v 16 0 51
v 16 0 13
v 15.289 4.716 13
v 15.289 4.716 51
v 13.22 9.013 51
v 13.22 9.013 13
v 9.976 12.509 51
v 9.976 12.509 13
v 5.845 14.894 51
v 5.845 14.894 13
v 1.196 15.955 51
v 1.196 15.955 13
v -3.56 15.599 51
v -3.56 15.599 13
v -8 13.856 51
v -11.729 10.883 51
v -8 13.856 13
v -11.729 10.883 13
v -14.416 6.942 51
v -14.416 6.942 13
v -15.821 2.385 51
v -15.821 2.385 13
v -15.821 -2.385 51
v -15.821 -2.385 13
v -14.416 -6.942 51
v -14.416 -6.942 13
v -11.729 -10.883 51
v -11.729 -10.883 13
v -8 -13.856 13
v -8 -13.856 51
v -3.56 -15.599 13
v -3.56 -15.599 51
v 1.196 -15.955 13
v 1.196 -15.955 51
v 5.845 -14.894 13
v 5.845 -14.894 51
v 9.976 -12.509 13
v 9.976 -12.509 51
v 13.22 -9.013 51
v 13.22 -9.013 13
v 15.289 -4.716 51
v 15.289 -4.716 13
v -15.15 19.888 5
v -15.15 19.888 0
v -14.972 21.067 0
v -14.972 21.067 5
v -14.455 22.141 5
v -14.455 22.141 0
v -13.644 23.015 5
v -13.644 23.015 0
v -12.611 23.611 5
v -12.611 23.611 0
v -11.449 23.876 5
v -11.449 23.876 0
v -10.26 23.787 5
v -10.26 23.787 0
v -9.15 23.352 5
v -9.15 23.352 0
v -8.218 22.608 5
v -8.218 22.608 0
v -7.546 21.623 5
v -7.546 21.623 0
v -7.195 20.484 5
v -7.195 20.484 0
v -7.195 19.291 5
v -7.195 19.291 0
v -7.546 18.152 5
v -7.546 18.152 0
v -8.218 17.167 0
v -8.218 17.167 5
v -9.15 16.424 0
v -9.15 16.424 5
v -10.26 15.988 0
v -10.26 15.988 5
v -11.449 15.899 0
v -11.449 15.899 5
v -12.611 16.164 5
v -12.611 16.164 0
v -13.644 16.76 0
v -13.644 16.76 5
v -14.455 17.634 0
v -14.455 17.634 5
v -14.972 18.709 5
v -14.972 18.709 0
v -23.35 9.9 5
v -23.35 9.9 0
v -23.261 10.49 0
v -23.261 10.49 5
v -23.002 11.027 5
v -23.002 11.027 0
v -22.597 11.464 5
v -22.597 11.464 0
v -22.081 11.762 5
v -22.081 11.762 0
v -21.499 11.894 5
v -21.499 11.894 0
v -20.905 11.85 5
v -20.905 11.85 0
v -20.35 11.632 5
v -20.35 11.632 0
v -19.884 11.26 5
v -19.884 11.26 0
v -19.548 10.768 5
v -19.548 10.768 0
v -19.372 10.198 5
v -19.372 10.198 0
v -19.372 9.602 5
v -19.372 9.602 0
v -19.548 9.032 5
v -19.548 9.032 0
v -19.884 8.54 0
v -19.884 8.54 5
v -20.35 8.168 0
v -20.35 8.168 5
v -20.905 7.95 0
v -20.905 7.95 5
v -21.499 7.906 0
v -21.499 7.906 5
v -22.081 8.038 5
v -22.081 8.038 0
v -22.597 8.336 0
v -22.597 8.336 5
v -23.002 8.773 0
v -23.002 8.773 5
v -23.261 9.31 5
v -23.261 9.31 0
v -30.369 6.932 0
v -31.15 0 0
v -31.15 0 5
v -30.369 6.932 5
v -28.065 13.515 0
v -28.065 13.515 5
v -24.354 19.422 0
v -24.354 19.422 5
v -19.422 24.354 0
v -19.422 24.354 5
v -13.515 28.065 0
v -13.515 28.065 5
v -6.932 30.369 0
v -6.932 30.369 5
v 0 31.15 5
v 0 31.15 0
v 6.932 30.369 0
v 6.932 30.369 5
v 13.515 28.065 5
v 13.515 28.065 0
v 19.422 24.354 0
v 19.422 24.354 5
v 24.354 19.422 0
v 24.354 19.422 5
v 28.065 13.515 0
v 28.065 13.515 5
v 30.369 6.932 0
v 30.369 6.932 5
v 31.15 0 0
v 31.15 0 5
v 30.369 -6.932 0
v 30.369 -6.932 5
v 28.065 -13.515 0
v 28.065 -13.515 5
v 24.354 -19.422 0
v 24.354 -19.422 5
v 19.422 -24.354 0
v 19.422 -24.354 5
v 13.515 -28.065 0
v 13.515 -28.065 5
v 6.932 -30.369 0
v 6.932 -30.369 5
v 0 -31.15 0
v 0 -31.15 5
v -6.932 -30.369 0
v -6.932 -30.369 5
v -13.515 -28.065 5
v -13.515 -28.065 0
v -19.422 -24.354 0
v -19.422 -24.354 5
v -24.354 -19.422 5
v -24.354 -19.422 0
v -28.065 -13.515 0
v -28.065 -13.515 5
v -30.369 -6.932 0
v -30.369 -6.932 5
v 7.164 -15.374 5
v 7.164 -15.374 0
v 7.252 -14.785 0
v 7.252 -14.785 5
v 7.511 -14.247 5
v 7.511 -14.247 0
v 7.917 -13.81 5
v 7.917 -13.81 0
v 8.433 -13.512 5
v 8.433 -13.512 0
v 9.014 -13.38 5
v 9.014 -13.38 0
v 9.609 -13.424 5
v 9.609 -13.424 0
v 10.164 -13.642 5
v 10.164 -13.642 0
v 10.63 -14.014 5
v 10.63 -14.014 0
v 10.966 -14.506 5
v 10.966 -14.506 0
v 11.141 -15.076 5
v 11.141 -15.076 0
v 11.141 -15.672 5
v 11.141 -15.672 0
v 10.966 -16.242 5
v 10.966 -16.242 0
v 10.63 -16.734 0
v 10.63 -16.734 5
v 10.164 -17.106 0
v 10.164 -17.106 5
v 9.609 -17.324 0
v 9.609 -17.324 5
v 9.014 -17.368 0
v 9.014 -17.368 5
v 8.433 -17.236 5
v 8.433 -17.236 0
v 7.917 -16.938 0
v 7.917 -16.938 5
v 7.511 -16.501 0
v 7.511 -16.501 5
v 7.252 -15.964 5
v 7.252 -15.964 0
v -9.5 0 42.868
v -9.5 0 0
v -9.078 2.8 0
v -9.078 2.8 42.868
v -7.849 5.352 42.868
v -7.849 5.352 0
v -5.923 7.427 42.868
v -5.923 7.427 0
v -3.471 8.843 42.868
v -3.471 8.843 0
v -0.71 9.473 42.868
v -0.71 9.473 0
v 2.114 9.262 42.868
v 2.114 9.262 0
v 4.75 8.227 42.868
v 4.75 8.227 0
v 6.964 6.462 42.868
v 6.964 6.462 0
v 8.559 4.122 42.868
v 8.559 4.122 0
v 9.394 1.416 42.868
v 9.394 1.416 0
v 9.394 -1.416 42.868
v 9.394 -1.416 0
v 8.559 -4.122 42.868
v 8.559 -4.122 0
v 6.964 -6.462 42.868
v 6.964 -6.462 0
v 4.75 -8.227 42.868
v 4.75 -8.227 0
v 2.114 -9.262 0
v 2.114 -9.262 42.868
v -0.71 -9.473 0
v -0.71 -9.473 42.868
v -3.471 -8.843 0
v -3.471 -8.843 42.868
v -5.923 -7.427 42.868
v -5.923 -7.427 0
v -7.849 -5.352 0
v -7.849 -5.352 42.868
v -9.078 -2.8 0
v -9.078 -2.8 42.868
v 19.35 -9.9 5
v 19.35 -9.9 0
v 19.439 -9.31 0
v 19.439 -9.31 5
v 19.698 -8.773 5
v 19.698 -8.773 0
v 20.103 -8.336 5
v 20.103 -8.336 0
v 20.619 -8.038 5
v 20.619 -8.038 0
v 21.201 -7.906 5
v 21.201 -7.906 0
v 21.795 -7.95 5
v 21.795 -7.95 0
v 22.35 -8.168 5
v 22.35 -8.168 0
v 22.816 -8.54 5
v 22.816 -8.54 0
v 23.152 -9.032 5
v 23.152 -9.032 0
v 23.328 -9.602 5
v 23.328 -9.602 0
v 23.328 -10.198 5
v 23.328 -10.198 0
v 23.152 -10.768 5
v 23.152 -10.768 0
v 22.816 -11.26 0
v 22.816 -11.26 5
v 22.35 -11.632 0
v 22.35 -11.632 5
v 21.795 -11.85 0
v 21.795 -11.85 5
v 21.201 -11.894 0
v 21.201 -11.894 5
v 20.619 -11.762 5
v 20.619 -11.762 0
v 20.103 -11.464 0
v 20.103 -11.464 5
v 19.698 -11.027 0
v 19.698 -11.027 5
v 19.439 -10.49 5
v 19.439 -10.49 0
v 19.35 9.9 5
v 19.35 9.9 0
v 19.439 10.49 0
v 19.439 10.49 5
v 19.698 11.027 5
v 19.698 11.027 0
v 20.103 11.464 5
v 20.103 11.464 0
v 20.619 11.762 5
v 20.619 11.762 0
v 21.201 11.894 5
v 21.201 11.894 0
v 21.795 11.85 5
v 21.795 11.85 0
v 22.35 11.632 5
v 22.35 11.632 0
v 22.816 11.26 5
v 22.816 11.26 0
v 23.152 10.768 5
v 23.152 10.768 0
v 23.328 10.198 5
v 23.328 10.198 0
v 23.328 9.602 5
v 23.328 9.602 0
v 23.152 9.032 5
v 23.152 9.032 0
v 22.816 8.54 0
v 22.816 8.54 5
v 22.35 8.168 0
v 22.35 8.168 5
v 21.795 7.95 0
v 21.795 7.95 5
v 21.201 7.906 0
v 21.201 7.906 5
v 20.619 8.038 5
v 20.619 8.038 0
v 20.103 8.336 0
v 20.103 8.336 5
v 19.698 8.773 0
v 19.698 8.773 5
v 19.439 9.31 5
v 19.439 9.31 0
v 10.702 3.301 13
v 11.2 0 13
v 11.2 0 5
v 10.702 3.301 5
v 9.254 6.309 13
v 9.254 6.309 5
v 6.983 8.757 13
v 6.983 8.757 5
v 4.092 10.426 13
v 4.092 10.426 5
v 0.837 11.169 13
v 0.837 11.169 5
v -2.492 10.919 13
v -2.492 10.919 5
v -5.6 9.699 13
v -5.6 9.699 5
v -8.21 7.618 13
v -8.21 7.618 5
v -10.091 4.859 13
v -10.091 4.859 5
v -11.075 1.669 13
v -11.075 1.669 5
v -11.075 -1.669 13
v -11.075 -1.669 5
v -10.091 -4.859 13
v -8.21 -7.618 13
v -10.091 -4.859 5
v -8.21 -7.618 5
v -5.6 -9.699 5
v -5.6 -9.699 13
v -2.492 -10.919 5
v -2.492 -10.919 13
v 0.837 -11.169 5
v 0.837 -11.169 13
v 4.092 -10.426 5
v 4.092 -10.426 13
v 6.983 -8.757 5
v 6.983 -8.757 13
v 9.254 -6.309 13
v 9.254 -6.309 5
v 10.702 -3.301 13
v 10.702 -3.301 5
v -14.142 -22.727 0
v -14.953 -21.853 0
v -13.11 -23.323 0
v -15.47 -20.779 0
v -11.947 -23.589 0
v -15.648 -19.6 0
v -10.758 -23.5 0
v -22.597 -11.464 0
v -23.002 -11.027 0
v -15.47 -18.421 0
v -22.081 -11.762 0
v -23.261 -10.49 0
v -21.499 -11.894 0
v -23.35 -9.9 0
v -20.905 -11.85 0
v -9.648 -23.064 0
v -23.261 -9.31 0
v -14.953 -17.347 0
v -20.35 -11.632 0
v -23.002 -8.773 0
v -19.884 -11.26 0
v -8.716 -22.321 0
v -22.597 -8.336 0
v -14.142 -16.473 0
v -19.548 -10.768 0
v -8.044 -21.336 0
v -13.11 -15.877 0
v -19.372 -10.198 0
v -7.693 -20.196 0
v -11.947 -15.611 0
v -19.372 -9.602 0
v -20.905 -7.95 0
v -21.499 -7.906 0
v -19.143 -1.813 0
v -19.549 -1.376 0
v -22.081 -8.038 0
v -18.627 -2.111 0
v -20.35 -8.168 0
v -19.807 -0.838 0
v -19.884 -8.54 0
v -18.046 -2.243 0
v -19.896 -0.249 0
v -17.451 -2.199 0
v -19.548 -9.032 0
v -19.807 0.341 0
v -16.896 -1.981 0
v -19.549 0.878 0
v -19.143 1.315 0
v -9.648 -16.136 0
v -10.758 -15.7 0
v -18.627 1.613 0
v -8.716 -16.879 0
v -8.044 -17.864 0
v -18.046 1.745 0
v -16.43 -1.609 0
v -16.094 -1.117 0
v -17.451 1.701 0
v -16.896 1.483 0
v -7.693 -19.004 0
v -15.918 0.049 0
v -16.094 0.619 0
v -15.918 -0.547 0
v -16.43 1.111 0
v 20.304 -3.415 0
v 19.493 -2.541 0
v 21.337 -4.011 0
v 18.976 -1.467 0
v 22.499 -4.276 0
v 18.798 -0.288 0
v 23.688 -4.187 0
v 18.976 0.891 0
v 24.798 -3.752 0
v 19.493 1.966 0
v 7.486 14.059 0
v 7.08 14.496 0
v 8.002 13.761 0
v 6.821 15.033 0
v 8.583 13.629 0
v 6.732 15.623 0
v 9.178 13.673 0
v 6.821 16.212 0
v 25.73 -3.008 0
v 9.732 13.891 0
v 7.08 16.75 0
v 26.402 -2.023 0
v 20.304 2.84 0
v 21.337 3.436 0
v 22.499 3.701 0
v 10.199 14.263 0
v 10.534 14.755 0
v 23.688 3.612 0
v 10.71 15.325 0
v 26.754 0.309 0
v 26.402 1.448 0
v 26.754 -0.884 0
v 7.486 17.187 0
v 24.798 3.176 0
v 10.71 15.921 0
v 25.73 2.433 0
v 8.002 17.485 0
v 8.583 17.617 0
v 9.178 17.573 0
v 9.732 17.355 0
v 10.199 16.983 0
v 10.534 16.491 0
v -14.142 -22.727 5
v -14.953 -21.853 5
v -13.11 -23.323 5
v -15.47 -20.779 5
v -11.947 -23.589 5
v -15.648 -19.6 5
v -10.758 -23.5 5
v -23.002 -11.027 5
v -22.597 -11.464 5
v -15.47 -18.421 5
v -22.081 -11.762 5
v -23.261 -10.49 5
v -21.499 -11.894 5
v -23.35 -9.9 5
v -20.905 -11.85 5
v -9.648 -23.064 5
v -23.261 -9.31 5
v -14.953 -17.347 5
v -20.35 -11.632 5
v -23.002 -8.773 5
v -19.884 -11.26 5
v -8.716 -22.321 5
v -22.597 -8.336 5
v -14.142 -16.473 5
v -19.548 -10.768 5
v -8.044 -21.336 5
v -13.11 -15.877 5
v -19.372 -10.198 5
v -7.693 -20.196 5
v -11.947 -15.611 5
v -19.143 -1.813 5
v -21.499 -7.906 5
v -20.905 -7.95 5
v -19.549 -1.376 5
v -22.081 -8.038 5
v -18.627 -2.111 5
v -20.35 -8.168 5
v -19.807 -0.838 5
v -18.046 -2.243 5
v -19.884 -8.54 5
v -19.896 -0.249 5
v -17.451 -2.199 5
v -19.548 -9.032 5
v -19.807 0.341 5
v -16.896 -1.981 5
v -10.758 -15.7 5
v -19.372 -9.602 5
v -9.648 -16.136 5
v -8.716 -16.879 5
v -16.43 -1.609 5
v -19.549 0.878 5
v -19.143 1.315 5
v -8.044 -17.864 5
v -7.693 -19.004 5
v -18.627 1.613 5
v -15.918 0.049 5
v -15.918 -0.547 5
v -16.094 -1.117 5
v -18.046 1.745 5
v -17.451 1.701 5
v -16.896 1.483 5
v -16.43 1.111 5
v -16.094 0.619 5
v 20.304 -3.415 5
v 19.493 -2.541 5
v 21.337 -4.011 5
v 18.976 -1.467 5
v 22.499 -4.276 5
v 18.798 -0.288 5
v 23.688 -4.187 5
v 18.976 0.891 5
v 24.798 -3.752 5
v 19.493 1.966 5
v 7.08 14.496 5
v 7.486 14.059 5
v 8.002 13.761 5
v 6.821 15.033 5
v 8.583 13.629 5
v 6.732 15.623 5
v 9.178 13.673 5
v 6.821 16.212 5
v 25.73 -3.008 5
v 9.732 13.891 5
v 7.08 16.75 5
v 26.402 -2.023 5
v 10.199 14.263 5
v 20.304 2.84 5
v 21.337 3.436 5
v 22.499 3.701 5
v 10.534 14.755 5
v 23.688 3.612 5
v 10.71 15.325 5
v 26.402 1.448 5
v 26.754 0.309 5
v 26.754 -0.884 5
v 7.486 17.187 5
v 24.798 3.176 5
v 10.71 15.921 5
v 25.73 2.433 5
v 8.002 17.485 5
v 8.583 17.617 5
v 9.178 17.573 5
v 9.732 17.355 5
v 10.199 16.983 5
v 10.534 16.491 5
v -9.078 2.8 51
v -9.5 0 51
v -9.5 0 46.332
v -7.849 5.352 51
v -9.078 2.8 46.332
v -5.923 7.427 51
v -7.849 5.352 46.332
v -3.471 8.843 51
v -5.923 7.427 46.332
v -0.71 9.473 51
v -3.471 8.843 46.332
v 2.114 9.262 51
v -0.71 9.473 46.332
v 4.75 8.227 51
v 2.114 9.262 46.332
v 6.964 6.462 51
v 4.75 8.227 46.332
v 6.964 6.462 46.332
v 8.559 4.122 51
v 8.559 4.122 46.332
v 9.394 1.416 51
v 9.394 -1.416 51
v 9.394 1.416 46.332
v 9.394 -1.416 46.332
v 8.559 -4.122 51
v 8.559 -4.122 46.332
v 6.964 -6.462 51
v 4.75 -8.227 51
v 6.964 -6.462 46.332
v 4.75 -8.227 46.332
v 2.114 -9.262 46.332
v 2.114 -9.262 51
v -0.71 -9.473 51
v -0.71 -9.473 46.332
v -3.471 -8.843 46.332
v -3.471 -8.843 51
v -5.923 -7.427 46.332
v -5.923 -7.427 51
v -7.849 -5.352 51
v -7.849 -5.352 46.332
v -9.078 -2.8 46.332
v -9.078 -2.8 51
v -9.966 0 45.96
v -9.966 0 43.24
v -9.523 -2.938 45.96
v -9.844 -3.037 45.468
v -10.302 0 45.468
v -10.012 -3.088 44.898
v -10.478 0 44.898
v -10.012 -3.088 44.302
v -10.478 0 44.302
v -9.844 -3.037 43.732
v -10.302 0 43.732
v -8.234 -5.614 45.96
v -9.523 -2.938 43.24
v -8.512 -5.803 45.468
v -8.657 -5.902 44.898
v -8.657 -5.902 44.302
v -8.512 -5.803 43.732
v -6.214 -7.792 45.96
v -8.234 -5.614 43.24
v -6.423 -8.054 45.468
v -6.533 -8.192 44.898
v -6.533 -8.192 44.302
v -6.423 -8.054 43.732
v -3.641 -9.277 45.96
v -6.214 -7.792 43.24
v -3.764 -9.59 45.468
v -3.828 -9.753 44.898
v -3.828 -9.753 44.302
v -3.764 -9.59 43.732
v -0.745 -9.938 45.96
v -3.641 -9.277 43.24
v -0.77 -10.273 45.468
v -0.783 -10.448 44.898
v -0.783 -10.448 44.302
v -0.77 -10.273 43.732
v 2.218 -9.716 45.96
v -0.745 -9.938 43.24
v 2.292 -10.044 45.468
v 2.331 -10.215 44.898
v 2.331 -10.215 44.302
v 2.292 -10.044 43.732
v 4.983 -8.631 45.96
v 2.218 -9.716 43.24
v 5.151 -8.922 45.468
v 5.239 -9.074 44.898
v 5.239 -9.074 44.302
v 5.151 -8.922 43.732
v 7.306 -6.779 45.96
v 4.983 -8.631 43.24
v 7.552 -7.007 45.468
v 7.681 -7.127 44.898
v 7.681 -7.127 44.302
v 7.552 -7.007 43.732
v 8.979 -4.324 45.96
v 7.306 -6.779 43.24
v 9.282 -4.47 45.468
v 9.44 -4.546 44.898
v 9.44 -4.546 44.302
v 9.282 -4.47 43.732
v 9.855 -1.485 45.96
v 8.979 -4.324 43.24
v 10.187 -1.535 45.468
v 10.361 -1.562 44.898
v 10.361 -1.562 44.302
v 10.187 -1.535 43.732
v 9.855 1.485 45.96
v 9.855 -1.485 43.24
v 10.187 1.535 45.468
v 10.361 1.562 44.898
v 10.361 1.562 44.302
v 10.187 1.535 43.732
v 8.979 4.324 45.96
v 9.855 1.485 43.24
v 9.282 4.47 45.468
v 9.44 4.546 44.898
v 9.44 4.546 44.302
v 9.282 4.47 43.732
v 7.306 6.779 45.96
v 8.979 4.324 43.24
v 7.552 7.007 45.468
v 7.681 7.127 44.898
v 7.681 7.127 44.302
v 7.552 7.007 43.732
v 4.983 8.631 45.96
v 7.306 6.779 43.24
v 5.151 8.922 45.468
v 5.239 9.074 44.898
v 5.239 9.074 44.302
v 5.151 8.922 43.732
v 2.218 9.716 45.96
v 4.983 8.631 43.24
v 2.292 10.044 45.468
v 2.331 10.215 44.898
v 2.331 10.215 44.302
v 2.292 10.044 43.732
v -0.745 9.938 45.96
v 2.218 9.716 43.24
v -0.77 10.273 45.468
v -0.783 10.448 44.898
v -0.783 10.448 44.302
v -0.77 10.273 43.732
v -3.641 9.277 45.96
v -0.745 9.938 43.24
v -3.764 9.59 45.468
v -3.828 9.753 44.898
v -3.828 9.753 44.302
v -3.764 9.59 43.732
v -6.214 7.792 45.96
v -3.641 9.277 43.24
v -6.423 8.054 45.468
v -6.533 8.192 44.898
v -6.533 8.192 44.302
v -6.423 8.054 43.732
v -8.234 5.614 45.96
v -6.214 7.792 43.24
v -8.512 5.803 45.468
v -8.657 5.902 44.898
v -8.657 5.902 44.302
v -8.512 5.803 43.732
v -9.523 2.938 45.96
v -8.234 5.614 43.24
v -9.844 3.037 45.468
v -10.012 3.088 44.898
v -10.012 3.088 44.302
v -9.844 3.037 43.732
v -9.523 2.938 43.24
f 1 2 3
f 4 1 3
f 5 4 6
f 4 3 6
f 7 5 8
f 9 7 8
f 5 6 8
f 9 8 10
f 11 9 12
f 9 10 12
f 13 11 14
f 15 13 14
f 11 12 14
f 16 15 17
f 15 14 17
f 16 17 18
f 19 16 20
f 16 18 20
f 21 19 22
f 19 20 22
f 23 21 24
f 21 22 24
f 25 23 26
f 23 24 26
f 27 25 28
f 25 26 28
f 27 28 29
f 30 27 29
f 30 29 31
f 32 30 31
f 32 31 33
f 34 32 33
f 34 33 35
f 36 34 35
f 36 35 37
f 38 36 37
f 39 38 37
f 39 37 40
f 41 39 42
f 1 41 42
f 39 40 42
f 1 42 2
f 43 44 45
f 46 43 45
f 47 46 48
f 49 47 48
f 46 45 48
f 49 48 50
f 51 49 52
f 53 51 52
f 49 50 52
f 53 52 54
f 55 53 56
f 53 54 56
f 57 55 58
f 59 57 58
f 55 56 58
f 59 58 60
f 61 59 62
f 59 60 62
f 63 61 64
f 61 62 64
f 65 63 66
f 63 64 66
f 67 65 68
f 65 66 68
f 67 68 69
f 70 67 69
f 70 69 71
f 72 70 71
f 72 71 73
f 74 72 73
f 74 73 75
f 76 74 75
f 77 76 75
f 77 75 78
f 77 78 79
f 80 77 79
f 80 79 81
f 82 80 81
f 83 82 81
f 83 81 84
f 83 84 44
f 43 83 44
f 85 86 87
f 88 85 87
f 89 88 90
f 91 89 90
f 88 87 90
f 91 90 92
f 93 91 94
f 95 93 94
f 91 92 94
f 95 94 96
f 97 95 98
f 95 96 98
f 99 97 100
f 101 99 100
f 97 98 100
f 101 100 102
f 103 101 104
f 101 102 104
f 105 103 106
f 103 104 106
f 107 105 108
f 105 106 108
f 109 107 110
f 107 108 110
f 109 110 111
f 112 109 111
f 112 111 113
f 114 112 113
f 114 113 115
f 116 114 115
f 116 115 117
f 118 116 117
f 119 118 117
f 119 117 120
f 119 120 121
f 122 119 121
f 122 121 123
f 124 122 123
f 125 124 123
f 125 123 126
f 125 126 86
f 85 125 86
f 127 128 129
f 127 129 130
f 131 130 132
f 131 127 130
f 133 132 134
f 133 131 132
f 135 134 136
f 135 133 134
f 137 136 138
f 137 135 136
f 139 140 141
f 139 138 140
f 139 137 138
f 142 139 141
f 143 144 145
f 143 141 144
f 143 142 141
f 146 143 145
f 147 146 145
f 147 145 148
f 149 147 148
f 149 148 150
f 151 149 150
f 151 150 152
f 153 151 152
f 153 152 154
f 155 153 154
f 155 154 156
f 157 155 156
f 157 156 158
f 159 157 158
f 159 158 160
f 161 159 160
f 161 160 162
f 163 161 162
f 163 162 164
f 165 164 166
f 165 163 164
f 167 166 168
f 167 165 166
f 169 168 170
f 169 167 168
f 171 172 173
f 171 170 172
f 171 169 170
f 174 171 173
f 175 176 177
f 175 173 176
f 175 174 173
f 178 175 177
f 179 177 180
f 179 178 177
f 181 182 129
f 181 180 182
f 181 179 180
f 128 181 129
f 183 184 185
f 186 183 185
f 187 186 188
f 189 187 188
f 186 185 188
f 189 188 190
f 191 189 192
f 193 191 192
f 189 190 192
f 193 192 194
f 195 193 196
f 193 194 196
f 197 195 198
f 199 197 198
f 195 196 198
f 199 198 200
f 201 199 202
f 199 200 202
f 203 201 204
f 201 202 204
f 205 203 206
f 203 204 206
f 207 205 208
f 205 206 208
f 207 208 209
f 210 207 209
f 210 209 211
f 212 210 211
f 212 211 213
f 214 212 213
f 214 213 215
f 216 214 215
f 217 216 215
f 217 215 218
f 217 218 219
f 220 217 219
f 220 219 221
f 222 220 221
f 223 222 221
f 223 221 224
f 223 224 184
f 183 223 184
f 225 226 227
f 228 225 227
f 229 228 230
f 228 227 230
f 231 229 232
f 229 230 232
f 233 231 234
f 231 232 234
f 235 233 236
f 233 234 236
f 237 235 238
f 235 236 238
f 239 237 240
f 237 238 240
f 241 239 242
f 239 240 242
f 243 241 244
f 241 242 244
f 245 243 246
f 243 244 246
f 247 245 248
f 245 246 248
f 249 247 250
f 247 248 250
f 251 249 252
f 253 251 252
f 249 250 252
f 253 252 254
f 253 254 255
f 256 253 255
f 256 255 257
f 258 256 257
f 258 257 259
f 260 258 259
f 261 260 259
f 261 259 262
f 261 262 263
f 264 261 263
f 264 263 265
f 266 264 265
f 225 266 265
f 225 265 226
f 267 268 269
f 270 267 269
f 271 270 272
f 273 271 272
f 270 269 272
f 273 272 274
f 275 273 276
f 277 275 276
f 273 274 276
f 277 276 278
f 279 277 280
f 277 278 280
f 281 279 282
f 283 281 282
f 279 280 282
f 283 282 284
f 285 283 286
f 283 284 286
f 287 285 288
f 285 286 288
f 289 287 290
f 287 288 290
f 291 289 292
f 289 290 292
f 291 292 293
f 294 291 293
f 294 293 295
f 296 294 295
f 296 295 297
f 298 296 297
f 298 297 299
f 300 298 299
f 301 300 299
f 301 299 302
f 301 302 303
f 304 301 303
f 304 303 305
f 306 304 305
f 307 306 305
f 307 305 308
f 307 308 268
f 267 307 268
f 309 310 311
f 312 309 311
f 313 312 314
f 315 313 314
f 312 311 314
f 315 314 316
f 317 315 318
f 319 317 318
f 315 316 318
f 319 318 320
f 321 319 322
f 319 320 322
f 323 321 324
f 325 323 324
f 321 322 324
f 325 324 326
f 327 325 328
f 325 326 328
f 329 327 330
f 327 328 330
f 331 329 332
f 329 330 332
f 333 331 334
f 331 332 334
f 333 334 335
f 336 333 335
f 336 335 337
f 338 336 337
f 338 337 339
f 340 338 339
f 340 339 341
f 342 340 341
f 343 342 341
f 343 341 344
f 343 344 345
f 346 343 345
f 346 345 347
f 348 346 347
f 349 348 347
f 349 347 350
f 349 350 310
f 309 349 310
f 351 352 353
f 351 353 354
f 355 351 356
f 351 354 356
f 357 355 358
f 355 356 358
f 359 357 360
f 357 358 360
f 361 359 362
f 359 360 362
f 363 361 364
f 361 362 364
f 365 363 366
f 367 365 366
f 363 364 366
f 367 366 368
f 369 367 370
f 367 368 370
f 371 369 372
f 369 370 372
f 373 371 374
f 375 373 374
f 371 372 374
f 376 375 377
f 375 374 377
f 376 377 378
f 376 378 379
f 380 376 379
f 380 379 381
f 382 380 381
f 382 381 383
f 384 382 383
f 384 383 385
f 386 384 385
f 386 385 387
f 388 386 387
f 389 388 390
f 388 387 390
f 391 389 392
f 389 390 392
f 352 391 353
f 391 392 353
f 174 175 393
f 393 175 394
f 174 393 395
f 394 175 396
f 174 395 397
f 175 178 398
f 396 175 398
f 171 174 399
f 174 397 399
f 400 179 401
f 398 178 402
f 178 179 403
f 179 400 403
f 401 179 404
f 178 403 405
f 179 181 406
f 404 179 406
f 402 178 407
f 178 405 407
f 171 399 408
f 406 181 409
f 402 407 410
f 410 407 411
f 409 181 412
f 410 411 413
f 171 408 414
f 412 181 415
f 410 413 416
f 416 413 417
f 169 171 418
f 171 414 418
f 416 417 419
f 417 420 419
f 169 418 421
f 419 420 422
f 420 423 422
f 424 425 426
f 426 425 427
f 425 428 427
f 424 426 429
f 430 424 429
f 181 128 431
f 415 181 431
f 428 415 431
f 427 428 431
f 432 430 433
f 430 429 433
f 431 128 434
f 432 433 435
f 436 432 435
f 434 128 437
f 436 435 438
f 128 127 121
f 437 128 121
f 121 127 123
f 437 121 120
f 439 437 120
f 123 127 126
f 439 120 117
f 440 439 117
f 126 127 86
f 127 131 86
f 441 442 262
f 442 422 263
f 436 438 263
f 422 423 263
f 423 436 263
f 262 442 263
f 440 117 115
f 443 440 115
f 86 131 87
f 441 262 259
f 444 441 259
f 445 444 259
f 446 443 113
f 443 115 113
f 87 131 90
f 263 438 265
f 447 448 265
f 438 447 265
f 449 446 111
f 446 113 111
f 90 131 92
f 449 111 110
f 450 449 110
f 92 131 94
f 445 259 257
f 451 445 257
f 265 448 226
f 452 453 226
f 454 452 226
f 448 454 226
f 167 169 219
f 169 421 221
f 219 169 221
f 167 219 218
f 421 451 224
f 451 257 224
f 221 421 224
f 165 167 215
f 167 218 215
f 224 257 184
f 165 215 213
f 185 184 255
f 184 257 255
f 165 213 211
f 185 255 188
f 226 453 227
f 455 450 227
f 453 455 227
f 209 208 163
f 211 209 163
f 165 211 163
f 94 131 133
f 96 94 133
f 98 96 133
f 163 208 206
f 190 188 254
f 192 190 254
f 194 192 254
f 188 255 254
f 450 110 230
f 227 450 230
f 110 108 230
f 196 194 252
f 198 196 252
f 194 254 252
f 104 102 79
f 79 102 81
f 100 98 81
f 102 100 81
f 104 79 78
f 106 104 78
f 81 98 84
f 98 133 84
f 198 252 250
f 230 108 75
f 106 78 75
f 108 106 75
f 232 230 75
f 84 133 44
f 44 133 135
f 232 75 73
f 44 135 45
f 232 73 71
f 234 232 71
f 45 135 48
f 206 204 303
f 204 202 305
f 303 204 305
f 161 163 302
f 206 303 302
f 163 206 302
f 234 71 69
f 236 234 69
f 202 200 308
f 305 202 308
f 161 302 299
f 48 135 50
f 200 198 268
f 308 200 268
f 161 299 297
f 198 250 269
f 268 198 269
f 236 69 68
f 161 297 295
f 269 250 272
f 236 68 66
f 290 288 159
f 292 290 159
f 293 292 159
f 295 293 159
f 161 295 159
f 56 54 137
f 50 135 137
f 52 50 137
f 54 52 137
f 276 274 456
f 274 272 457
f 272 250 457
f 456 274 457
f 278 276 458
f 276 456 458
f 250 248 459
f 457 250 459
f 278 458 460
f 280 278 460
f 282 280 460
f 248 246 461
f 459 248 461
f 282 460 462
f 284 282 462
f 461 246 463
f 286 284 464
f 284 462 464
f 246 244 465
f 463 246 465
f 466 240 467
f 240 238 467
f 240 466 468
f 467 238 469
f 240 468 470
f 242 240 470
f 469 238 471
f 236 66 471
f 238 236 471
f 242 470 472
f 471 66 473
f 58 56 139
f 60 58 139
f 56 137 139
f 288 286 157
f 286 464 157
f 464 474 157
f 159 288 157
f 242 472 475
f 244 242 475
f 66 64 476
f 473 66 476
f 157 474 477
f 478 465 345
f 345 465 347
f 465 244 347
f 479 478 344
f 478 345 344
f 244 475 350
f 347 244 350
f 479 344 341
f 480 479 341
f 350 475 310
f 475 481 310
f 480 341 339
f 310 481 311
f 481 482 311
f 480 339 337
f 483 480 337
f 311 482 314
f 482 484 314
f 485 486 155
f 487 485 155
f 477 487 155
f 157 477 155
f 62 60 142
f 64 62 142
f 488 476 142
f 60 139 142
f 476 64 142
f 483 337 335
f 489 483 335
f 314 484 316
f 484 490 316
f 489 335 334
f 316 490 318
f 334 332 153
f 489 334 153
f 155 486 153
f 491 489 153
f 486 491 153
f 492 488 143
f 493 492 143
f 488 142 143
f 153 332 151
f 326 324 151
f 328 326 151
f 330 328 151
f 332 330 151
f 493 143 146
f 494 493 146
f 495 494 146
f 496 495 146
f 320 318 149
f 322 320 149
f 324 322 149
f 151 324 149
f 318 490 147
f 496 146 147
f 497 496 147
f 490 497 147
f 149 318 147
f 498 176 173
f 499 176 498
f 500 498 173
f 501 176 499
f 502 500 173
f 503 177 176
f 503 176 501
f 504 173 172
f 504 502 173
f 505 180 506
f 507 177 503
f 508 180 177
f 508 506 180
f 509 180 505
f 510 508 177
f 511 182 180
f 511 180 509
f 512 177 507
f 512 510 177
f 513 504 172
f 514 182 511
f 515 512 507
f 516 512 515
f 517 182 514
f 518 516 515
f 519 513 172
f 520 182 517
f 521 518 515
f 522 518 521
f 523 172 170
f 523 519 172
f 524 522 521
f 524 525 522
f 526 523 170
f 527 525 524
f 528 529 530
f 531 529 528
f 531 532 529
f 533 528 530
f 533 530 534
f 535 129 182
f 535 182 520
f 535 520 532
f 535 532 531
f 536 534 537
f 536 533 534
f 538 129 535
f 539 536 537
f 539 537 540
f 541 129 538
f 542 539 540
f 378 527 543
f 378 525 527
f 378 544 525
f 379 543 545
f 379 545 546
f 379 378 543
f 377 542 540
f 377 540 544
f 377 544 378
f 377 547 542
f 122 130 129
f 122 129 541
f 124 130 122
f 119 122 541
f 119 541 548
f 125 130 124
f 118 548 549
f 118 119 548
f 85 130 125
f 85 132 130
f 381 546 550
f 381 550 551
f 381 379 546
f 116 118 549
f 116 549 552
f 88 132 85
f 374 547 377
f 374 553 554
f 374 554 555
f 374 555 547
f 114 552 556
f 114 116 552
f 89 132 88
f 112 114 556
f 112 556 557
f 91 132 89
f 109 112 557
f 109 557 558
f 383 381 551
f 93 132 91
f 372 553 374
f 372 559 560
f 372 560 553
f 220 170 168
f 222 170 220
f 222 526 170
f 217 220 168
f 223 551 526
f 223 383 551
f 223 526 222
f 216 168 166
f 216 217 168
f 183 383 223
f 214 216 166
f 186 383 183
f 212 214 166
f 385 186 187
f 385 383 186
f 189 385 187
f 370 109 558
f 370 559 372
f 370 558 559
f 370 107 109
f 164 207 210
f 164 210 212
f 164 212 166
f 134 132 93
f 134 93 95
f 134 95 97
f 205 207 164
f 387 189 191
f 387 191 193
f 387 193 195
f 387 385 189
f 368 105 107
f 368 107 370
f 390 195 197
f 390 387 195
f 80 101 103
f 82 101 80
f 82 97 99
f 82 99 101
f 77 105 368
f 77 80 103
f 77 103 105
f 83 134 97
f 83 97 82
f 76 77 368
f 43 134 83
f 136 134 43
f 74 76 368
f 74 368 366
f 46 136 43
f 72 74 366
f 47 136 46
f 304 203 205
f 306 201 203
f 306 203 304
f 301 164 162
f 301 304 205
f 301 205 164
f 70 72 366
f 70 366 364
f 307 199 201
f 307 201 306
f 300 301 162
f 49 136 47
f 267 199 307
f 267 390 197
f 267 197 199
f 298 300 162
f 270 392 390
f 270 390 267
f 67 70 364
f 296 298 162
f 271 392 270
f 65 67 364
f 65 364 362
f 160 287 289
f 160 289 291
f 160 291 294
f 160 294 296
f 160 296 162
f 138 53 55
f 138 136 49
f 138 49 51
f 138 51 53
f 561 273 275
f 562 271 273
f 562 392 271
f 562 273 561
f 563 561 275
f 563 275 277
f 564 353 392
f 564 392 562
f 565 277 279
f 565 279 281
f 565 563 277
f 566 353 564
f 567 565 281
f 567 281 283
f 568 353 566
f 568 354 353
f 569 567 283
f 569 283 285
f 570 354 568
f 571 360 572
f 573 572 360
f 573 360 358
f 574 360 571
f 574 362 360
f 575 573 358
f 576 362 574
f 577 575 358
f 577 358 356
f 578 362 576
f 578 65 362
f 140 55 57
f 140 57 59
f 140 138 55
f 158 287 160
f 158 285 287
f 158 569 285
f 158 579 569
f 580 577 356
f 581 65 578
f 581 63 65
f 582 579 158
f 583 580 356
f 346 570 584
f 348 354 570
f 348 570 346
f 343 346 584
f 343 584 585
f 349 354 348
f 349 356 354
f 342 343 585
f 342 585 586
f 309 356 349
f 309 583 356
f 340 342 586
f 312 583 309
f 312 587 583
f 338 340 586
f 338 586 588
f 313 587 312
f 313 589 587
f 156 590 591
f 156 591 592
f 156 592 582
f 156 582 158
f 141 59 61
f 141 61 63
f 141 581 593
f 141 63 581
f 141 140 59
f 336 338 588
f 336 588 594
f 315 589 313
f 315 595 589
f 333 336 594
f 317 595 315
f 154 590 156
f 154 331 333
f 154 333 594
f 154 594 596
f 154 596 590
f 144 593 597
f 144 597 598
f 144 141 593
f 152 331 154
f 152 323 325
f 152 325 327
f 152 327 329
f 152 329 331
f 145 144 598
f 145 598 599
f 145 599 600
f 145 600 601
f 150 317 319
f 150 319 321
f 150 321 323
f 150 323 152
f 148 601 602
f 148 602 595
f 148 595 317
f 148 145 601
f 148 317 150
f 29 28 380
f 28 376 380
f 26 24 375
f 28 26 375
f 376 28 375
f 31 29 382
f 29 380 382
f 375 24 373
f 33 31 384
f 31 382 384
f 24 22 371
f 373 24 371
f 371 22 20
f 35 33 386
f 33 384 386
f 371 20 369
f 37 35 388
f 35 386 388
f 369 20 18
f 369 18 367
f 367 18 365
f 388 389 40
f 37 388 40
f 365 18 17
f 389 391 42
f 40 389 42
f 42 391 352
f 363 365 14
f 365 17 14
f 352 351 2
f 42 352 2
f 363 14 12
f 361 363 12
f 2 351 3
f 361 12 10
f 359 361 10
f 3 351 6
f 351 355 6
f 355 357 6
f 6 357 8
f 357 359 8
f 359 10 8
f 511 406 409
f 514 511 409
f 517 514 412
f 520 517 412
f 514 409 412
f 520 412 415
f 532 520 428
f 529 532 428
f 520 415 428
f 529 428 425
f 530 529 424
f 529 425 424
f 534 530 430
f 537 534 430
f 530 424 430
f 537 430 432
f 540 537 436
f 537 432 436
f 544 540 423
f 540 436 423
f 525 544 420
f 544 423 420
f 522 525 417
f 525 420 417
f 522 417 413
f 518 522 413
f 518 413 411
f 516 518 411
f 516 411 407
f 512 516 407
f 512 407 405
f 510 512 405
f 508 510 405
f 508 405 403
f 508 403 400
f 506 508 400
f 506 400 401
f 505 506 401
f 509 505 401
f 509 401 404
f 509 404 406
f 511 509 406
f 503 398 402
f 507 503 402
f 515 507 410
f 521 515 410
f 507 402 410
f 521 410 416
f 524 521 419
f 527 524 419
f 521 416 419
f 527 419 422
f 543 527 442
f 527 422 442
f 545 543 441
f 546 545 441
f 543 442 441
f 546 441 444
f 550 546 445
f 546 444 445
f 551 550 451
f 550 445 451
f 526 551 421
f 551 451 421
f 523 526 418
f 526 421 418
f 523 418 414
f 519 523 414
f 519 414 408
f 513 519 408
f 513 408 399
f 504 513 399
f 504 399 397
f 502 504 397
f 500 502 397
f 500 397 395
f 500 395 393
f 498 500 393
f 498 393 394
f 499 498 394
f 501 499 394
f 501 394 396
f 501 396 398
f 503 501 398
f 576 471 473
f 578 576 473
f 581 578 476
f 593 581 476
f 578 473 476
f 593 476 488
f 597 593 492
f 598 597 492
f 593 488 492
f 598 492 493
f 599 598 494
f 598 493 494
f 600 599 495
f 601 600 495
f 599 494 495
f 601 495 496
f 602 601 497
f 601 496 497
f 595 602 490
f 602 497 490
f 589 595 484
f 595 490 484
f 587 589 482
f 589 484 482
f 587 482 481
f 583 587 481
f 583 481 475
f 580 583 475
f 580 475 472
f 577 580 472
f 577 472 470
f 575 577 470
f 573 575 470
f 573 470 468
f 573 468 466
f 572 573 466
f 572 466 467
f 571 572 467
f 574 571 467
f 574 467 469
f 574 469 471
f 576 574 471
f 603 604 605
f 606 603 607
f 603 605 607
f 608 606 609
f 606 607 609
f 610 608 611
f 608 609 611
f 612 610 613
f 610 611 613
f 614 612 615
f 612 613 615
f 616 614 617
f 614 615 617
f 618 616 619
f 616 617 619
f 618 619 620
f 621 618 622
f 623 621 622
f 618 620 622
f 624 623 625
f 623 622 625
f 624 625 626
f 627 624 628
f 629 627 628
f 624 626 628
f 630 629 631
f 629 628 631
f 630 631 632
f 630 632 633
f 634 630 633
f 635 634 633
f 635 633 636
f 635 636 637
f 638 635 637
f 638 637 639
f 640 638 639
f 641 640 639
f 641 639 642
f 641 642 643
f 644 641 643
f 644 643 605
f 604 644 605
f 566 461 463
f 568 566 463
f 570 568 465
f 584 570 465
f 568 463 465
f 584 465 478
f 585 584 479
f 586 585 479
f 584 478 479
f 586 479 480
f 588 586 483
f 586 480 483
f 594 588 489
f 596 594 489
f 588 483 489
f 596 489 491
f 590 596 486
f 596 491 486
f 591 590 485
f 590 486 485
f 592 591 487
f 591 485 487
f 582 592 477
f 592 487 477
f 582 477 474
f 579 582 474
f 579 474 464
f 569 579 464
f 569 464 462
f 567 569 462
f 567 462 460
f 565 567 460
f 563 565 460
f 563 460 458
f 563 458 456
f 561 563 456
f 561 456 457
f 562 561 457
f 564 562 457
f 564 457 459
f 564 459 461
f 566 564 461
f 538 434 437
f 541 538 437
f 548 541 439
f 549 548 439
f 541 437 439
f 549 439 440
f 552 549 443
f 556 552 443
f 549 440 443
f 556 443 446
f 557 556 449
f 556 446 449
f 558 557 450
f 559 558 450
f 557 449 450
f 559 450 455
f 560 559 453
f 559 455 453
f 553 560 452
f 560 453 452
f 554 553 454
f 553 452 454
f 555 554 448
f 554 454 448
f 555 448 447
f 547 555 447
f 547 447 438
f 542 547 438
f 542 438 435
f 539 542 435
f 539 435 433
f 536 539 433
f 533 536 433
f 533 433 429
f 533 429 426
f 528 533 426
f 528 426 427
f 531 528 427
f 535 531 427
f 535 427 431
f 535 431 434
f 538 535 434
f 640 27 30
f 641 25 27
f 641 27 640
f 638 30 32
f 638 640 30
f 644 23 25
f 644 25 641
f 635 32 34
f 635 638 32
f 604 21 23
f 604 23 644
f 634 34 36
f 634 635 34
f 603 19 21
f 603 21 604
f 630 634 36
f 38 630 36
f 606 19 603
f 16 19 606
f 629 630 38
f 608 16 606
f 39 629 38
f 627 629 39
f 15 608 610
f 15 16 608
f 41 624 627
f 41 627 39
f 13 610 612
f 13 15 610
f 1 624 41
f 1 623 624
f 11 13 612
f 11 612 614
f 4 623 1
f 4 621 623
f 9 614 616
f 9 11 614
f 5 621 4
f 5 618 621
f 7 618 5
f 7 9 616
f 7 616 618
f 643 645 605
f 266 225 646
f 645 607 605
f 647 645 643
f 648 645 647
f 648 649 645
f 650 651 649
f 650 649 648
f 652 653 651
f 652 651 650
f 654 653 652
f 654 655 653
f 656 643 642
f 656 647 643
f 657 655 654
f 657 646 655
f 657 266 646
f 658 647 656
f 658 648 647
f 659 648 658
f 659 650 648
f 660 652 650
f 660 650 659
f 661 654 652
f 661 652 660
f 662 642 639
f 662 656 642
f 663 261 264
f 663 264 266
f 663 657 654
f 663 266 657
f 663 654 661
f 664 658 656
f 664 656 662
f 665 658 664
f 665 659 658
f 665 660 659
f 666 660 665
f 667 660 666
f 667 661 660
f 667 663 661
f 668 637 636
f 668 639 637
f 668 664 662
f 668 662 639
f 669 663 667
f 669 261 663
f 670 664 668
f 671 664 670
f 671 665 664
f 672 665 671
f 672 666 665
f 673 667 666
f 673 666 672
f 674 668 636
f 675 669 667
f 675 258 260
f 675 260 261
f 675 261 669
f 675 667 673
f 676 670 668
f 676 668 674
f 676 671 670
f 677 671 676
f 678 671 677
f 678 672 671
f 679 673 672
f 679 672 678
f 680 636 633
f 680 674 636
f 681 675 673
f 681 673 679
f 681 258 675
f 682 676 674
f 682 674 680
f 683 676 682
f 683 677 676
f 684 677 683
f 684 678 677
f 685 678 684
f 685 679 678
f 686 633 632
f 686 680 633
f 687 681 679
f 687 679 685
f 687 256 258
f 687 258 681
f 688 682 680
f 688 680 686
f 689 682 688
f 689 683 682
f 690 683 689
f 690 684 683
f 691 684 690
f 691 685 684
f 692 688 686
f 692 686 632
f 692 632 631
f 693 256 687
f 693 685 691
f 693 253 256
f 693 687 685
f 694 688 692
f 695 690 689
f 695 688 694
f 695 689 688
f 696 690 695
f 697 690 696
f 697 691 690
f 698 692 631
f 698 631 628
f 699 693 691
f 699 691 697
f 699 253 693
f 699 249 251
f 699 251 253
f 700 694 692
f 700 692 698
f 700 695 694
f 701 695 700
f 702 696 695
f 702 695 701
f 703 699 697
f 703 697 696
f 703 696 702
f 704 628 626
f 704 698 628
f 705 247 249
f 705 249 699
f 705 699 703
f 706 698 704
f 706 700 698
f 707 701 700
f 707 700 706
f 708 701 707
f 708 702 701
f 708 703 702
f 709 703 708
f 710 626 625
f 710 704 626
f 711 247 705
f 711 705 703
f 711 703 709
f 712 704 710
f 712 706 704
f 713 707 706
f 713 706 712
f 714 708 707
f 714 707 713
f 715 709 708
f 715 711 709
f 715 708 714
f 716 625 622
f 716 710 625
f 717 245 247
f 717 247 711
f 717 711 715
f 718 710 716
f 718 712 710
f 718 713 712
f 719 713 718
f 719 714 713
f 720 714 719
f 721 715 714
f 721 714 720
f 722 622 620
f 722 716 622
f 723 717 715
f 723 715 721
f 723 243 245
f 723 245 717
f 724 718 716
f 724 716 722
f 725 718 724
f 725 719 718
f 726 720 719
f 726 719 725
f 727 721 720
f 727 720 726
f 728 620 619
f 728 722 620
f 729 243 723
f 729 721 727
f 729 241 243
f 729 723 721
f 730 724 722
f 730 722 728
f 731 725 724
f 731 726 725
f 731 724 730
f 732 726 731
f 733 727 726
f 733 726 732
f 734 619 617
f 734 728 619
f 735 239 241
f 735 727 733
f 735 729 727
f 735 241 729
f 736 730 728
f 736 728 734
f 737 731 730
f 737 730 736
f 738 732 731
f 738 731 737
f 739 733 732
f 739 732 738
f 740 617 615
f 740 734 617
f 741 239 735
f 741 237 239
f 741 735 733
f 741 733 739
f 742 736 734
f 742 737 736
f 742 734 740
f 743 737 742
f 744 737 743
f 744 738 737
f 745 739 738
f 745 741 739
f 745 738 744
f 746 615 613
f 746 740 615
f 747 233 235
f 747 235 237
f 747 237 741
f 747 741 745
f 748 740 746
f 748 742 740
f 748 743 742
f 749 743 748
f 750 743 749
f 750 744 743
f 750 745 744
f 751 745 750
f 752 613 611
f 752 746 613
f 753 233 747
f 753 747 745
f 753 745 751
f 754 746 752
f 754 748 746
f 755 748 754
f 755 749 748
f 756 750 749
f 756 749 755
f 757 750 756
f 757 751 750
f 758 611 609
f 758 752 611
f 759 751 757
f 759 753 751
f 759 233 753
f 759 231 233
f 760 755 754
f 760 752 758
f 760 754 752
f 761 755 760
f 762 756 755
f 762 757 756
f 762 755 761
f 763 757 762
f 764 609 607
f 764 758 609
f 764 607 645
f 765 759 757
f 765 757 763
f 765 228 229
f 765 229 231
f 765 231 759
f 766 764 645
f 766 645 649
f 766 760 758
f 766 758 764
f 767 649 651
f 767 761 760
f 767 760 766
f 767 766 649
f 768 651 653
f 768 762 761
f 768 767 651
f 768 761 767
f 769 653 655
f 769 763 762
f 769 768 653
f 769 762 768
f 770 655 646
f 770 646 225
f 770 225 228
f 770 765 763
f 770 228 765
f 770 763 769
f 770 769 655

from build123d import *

# Parameters (mm, degrees)
SKETCH1_R           = 31.65
BOSS_EXTRUDE1_DEPTH = 5
CHAMFER1_SIZE       = 0.5
SKETCH2_R           = 11.2
BOSS_EXTRUDE2_DEPTH = 8
SKETCH3_R           = 16
BOSS_EXTRUDE3_DEPTH = 38
SKETCH5_R           = 9.5
CUT_EXTRUDE2_DEPTH  = 52
CUT_EXTRUDE3_REACH  = 53
SKETCH6_R           = 2
SKETCH6_R_2         = 4
SKETCH8_OUTSIDE_W   = 85.906
SKETCH8_OUTSIDE_H   = 85.906
SKETCH8_OUTSIDE_R   = 31.15
SKETCH8_OUTSIDE_R_2 = 4
CUT_EXTRUDE4_DEPTH  = 10


with BuildPart() as part:
    # Sketch1 → Boss-Extrude1 (new body)
    with BuildSketch(Plane.XY):
        Circle(SKETCH1_R)
    extrude(amount=BOSS_EXTRUDE1_DEPTH)

    # Chamfer1
    chamfer1_edges = [part.edges().sort_by_distance(p)[0] for p in [
        (-31.65, 0, 0),
        (-31.65, 0, 5),
    ]]
    chamfer(chamfer1_edges, length=CHAMFER1_SIZE)

    # Sketch2 → Boss-Extrude2 (add)
    with BuildSketch(Plane.XY.offset(5)):
        Circle(SKETCH2_R)
    extrude(amount=BOSS_EXTRUDE2_DEPTH)

    # Sketch3 → Boss-Extrude3 (add)
    with BuildSketch(Plane.XY.offset(13)):
        Circle(SKETCH3_R)
    extrude(amount=BOSS_EXTRUDE3_DEPTH)

    # Sketch5 → Cut-Extrude2 (cut, through all)
    with BuildSketch(Plane(origin=(0, 0, 0), x_dir=(-1, 0, 0), z_dir=(0, 0, -1))):
        Circle(SKETCH5_R)
    extrude(amount=-CUT_EXTRUDE2_DEPTH, mode=Mode.SUBTRACT)

    # Sketch6 → Cut-Extrude3 (cut, up to next)
    with BuildSketch(Plane(origin=(0, 0, 0), x_dir=(-1, 0, 0), z_dir=(0, 0, -1)), mode=Mode.PRIVATE) as cut_extrude3_sk1:
        with Locations((21.35, 9.9)):
            Circle(SKETCH6_R)
    cut_extrude3_tool1 = extrude(cut_extrude3_sk1.sketch, amount=-CUT_EXTRUDE3_REACH, mode=Mode.PRIVATE) & part.part
    add(cut_extrude3_tool1.solids().sort_by_distance((-21.35, 9.9, 0))[0], mode=Mode.SUBTRACT)
    # Sketch6 → Cut-Extrude3 (cut, up to next)
    with BuildSketch(Plane(origin=(0, 0, 0), x_dir=(-1, 0, 0), z_dir=(0, 0, -1)), mode=Mode.PRIVATE) as cut_extrude3_sk2:
        with Locations((-21.35, 9.9)):
            Circle(SKETCH6_R)
    cut_extrude3_tool2 = extrude(cut_extrude3_sk2.sketch, amount=-CUT_EXTRUDE3_REACH, mode=Mode.PRIVATE) & part.part
    add(cut_extrude3_tool2.solids().sort_by_distance((21.35, 9.9, 0))[0], mode=Mode.SUBTRACT)
    # Sketch6 → Cut-Extrude3 (cut, up to next)
    with BuildSketch(Plane(origin=(0, 0, 0), x_dir=(-1, 0, 0), z_dir=(0, 0, -1)), mode=Mode.PRIVATE) as cut_extrude3_sk3:
        with Locations((-21.35, -9.9)):
            Circle(SKETCH6_R)
    cut_extrude3_tool3 = extrude(cut_extrude3_sk3.sketch, amount=-CUT_EXTRUDE3_REACH, mode=Mode.PRIVATE) & part.part
    add(cut_extrude3_tool3.solids().sort_by_distance((21.35, -9.9, 0))[0], mode=Mode.SUBTRACT)
    # Sketch6 → Cut-Extrude3 (cut, up to next)
    with BuildSketch(Plane(origin=(0, 0, 0), x_dir=(-1, 0, 0), z_dir=(0, 0, -1)), mode=Mode.PRIVATE) as cut_extrude3_sk4:
        with Locations((21.35, -9.9)):
            Circle(SKETCH6_R)
    cut_extrude3_tool4 = extrude(cut_extrude3_sk4.sketch, amount=-CUT_EXTRUDE3_REACH, mode=Mode.PRIVATE) & part.part
    add(cut_extrude3_tool4.solids().sort_by_distance((-21.35, -9.9, 0))[0], mode=Mode.SUBTRACT)
    # Sketch6 → Cut-Extrude3 (cut, up to next)
    with BuildSketch(Plane(origin=(0, 0, 0), x_dir=(-1, 0, 0), z_dir=(0, 0, -1)), mode=Mode.PRIVATE) as cut_extrude3_sk5:
        with Locations((11.648195828, -19.6)):
            Circle(SKETCH6_R_2)
    cut_extrude3_tool5 = extrude(cut_extrude3_sk5.sketch, amount=-CUT_EXTRUDE3_REACH, mode=Mode.PRIVATE) & part.part
    add(cut_extrude3_tool5.solids().sort_by_distance((-11.648196, -19.6, 0))[0], mode=Mode.SUBTRACT)
    # Sketch6 → Cut-Extrude3 (cut, up to next)
    with BuildSketch(Plane(origin=(0, 0, 0), x_dir=(-1, 0, 0), z_dir=(0, 0, -1)), mode=Mode.PRIVATE) as cut_extrude3_sk6:
        with Locations((-8.732486564, 15.622964243)):
            Circle(SKETCH6_R)
    cut_extrude3_tool6 = extrude(cut_extrude3_sk6.sketch, amount=-CUT_EXTRUDE3_REACH, mode=Mode.PRIVATE) & part.part
    add(cut_extrude3_tool6.solids().sort_by_distance((8.732487, 15.622964, 0))[0], mode=Mode.SUBTRACT)
    # Sketch6 → Cut-Extrude3 (cut, up to next)
    with BuildSketch(Plane(origin=(0, 0, 0), x_dir=(-1, 0, 0), z_dir=(0, 0, -1)), mode=Mode.PRIVATE) as cut_extrude3_sk7:
        with Locations((-9.163640635, -15.374037324)):
            Circle(SKETCH6_R)
    cut_extrude3_tool7 = extrude(cut_extrude3_sk7.sketch, amount=-CUT_EXTRUDE3_REACH, mode=Mode.PRIVATE) & part.part
    add(cut_extrude3_tool7.solids().sort_by_distance((9.163641, -15.374037, 0))[0], mode=Mode.SUBTRACT)
    # Sketch6 → Cut-Extrude3 (cut, up to next)
    with BuildSketch(Plane(origin=(0, 0, 0), x_dir=(-1, 0, 0), z_dir=(0, 0, -1)), mode=Mode.PRIVATE) as cut_extrude3_sk8:
        with Locations((17.896127199, -0.248926919)):
            Circle(SKETCH6_R)
    cut_extrude3_tool8 = extrude(cut_extrude3_sk8.sketch, amount=-CUT_EXTRUDE3_REACH, mode=Mode.PRIVATE) & part.part
    add(cut_extrude3_tool8.solids().sort_by_distance((-17.896127, -0.248927, 0))[0], mode=Mode.SUBTRACT)

    # Sketch7 → Cut-Revolve3 (revolve, cut)
    with BuildSketch(Plane(origin=(0, 0, 0), x_dir=(1, 0, 0), z_dir=(0, 1, 0))):
        with BuildLine():
            Line((-8.5, -42.6), (-8.5, -46.6))
            ThreePointArc((-8.5, -46.6), (-10.5, -44.6), (-8.5, -42.6))
        make_face()
    revolve(axis=Axis((0, 0, 44.6), (0, 0, 1)), mode=Mode.SUBTRACT)

    # Sketch8 outside → Cut-Extrude4 (cut)
    with BuildSketch(Plane(origin=(0, 0, 0), x_dir=(-1, 0, 0), z_dir=(0, 0, -1))):
        Rectangle(SKETCH8_OUTSIDE_W, SKETCH8_OUTSIDE_H)
        Circle(SKETCH8_OUTSIDE_R, mode=Mode.SUBTRACT)
        with Locations((-22.798195828, -0.287633496)):
            Circle(SKETCH8_OUTSIDE_R_2)
        with Locations((11.15, 19.887633496)):
            Circle(SKETCH8_OUTSIDE_R_2)
    extrude(amount=-CUT_EXTRUDE4_DEPTH, mode=Mode.SUBTRACT)


solid = part.part
